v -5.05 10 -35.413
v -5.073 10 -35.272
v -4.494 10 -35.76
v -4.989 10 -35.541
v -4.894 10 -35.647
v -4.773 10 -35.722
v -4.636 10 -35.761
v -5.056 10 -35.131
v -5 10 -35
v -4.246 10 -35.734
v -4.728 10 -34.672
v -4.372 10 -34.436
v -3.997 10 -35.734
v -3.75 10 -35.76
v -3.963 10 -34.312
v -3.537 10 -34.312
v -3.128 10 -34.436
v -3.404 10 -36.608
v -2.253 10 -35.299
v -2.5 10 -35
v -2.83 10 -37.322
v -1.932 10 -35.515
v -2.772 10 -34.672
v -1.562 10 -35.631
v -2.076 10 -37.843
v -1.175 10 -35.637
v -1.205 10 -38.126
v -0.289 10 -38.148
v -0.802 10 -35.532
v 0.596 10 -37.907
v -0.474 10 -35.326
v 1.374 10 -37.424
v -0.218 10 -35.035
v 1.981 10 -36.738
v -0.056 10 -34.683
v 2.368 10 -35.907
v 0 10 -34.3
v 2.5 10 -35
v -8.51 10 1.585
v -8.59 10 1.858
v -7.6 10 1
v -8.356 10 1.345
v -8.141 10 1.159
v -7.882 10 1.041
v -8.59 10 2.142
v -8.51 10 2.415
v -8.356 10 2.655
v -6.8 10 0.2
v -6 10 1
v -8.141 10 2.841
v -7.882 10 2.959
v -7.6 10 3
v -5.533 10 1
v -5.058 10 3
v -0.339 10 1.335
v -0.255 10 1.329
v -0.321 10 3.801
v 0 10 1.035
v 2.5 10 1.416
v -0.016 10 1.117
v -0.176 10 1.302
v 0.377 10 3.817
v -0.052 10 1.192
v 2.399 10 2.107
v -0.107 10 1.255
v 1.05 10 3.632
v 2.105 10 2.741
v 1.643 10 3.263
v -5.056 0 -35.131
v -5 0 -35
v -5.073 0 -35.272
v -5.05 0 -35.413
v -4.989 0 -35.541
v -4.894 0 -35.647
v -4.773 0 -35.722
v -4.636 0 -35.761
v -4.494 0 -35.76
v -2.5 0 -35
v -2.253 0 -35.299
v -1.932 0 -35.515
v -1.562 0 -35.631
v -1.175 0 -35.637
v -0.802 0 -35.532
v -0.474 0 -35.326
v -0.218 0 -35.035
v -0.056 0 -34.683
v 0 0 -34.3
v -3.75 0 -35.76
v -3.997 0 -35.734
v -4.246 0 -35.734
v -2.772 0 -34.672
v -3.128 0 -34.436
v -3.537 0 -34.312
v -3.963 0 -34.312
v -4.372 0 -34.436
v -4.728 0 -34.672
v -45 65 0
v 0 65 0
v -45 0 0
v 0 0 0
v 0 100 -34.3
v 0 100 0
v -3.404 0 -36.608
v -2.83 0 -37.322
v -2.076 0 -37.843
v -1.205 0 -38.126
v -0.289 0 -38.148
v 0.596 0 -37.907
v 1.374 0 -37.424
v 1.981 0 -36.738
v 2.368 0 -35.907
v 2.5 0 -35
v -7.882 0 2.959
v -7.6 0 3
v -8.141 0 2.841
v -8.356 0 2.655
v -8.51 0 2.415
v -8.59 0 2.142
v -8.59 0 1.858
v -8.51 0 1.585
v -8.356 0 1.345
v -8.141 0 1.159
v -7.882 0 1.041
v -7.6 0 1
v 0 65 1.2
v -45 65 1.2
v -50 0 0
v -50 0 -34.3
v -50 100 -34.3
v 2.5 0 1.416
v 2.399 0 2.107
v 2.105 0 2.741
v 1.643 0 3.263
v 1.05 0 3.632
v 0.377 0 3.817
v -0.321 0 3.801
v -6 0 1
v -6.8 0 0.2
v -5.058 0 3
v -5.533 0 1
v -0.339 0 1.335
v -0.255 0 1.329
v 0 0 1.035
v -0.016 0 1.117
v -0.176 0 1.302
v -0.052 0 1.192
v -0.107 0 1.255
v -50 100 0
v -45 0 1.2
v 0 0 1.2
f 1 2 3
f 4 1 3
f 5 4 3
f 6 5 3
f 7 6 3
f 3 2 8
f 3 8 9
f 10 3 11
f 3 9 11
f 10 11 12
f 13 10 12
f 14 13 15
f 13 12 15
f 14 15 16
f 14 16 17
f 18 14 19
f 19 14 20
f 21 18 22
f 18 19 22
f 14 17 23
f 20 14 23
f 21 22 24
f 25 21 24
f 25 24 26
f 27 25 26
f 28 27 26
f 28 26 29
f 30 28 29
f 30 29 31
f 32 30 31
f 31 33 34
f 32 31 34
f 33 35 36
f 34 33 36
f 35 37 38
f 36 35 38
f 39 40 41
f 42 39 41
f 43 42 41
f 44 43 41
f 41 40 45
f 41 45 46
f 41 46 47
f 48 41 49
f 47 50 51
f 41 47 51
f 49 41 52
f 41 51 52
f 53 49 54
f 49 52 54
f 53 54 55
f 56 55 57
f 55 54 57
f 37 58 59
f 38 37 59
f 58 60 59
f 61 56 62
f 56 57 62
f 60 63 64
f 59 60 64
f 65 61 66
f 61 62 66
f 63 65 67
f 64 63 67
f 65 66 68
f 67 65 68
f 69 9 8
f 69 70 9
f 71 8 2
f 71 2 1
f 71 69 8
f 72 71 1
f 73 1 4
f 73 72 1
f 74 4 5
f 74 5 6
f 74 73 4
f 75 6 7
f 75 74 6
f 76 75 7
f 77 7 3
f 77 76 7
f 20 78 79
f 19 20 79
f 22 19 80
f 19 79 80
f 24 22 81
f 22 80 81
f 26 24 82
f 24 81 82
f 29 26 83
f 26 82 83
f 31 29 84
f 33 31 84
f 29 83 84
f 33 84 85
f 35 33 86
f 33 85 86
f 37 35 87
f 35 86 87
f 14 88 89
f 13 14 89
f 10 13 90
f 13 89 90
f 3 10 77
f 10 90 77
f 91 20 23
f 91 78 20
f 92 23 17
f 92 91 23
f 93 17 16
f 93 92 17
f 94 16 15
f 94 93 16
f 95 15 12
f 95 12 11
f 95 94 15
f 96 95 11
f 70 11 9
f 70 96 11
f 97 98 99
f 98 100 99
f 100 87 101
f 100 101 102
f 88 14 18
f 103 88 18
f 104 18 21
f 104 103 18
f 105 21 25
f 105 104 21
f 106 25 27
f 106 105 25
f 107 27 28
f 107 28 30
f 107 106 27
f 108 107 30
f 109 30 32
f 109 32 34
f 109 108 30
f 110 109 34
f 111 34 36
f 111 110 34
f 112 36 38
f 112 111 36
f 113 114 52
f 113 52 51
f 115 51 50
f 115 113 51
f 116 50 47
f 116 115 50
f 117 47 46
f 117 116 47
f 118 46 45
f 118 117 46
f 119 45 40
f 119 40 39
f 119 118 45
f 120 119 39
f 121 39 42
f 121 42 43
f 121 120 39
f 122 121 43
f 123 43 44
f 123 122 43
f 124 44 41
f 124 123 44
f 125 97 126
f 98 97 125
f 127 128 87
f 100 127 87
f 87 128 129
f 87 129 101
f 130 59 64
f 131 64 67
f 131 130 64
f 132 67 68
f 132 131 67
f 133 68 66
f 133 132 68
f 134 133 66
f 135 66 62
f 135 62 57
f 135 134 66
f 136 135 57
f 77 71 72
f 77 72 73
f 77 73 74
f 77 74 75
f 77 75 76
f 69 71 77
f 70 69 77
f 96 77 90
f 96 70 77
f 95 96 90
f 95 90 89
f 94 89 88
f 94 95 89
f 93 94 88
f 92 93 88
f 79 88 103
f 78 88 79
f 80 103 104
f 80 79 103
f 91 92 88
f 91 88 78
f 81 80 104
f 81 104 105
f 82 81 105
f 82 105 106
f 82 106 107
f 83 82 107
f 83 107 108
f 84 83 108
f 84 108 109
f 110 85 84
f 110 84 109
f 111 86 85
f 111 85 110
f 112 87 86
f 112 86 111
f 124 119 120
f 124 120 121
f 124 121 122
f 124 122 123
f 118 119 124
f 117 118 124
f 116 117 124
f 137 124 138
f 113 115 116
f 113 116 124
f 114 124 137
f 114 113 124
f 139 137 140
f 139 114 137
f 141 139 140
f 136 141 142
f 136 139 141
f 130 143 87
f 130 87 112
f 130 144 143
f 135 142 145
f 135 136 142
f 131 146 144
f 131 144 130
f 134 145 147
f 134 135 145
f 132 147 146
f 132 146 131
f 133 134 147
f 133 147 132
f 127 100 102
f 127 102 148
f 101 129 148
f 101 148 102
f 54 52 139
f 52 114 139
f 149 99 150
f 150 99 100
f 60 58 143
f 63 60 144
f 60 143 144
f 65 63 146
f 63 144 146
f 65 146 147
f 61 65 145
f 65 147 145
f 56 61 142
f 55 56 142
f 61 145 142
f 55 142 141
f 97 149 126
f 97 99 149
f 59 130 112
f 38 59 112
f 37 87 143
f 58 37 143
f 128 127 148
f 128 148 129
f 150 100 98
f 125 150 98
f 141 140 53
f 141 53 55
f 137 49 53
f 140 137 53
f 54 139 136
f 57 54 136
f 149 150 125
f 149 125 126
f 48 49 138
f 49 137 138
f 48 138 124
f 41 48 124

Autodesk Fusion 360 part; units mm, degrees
sketch "Sketch1" plane through (0, 0, 0) normal (0, 1, 0) x (1, 0, 0) in component "table"
  line L0 (0, 0) -> (-50, 0)
  line L1 (-50, 0) -> (-50, 34.3)
  line L2 (-50, 34.3) -> (0, 34.3)
  line L3 (0, 34.3) -> (0, 0)
  dimension "d1" = 50
  dimension "d2" = 34.3
extrude "Extrude1" add sketch "Sketch1" along normal blind 100 makes body 1 in component "table"
sketch "Sketch1 (2)" plane through (0, 0, 0) normal (0, 0, 1) x (-1, 0, 0) in component "mouse-mat"
  line L0 (50, 0) -> (0, 0)
  line L1 (0, 0) -> (0, -100)
  line L2 (0, -100) -> (50, -100)
  line L3 (50, -100) -> (50, 0)
  line L4 (0, 0) -> (45, 0)
  line L5 (45, 0) -> (45, -65)
  line L6 (45, -65) -> (0, -65)
  line L7 (0, -65) -> (0, 0)
extrude "Extrude1'" add sketch "Sketch1 (2)" along normal blind 1.2 separate body contours L0 L1 L4 L5 L6 L7 makes body 2 in component "mouse-mat"
sketch "Sketch1 (3)" plane through (0, 0, 0) normal (0, -1, 0) x (1, 0, 0) in component "clip"
  line L0 (0, -34.3) -> (0, 0)
  line L1 (0, 0) -> (-50, 0)
  line L2 (-50, 0) -> (-50, -34.3)
  line L3 (-7.6004, 1) -> (-5.5332, 1)
  line L4 (-5.5332, 1) -> (-0.3386, 1.3346)
  line L5 (0, 1.0347) -> (0, -34.3)
  line L6 (-7.6004, 3) -> (-5.0582, 3)
  line L7 (-5.0582, 3) -> (-0.3212, 3.8008)
  arc A0 (2.5, 1.4165) -> (-0.3212, 3.8008) centre (0.0819, 1.4165) ccw
  line L8 (2.5, 1.4165) -> (2.5, -35)
  arc A1 (-7.6004, 3) -> (-7.6004, 1) centre (-7.6004, 2) ccw
  arc A2 (0, 1.0347) -> (-0.3386, 1.3346) centre (-0.3181, 1.0167) ccw
  arc A3 (-2.5, -35) -> (0, -34.3) centre (-1.348, -34.3) ccw
  arc A4 (-2.5, -35) -> (-5, -35) centre (-3.75, -35.7595) ccw
  arc A5 (-3.75, -35.7595) -> (2.5, -35) centre (-0.6712, -35) ccw
  arc A6 (-5, -35) -> (-4.4935, -35.7595) centre (-4.5695, -35.2616) ccw
  arc A7 (-3.75, -35.7595) -> (-4.4935, -35.7595) centre (-4.1218, -38.1964) ccw
  line L9 (-6, 1) -> (-6.8, 0.2)
  line L10 (-6.8, 0.2) -> (-7.6004, 1)
  dimension "d7" = 2
extrude "Extrude1''" add sketch "Sketch1 (3)" against normal blind 10 separate body makes body 3 in component "clip"
component "table" placed x (1, 0, 0) y (0, 1, 0) z (0, 0, 1) at (0, 0, 0)
component "mouse-mat" placed x (1, 0, 0) y (0, 1, 0) z (0, 0, 1) at (0, 0, 0)
component "clip" placed x (1, 0, 0) y (0, 1, 0) z (0, 0, 1) at (0, 0, 0)
